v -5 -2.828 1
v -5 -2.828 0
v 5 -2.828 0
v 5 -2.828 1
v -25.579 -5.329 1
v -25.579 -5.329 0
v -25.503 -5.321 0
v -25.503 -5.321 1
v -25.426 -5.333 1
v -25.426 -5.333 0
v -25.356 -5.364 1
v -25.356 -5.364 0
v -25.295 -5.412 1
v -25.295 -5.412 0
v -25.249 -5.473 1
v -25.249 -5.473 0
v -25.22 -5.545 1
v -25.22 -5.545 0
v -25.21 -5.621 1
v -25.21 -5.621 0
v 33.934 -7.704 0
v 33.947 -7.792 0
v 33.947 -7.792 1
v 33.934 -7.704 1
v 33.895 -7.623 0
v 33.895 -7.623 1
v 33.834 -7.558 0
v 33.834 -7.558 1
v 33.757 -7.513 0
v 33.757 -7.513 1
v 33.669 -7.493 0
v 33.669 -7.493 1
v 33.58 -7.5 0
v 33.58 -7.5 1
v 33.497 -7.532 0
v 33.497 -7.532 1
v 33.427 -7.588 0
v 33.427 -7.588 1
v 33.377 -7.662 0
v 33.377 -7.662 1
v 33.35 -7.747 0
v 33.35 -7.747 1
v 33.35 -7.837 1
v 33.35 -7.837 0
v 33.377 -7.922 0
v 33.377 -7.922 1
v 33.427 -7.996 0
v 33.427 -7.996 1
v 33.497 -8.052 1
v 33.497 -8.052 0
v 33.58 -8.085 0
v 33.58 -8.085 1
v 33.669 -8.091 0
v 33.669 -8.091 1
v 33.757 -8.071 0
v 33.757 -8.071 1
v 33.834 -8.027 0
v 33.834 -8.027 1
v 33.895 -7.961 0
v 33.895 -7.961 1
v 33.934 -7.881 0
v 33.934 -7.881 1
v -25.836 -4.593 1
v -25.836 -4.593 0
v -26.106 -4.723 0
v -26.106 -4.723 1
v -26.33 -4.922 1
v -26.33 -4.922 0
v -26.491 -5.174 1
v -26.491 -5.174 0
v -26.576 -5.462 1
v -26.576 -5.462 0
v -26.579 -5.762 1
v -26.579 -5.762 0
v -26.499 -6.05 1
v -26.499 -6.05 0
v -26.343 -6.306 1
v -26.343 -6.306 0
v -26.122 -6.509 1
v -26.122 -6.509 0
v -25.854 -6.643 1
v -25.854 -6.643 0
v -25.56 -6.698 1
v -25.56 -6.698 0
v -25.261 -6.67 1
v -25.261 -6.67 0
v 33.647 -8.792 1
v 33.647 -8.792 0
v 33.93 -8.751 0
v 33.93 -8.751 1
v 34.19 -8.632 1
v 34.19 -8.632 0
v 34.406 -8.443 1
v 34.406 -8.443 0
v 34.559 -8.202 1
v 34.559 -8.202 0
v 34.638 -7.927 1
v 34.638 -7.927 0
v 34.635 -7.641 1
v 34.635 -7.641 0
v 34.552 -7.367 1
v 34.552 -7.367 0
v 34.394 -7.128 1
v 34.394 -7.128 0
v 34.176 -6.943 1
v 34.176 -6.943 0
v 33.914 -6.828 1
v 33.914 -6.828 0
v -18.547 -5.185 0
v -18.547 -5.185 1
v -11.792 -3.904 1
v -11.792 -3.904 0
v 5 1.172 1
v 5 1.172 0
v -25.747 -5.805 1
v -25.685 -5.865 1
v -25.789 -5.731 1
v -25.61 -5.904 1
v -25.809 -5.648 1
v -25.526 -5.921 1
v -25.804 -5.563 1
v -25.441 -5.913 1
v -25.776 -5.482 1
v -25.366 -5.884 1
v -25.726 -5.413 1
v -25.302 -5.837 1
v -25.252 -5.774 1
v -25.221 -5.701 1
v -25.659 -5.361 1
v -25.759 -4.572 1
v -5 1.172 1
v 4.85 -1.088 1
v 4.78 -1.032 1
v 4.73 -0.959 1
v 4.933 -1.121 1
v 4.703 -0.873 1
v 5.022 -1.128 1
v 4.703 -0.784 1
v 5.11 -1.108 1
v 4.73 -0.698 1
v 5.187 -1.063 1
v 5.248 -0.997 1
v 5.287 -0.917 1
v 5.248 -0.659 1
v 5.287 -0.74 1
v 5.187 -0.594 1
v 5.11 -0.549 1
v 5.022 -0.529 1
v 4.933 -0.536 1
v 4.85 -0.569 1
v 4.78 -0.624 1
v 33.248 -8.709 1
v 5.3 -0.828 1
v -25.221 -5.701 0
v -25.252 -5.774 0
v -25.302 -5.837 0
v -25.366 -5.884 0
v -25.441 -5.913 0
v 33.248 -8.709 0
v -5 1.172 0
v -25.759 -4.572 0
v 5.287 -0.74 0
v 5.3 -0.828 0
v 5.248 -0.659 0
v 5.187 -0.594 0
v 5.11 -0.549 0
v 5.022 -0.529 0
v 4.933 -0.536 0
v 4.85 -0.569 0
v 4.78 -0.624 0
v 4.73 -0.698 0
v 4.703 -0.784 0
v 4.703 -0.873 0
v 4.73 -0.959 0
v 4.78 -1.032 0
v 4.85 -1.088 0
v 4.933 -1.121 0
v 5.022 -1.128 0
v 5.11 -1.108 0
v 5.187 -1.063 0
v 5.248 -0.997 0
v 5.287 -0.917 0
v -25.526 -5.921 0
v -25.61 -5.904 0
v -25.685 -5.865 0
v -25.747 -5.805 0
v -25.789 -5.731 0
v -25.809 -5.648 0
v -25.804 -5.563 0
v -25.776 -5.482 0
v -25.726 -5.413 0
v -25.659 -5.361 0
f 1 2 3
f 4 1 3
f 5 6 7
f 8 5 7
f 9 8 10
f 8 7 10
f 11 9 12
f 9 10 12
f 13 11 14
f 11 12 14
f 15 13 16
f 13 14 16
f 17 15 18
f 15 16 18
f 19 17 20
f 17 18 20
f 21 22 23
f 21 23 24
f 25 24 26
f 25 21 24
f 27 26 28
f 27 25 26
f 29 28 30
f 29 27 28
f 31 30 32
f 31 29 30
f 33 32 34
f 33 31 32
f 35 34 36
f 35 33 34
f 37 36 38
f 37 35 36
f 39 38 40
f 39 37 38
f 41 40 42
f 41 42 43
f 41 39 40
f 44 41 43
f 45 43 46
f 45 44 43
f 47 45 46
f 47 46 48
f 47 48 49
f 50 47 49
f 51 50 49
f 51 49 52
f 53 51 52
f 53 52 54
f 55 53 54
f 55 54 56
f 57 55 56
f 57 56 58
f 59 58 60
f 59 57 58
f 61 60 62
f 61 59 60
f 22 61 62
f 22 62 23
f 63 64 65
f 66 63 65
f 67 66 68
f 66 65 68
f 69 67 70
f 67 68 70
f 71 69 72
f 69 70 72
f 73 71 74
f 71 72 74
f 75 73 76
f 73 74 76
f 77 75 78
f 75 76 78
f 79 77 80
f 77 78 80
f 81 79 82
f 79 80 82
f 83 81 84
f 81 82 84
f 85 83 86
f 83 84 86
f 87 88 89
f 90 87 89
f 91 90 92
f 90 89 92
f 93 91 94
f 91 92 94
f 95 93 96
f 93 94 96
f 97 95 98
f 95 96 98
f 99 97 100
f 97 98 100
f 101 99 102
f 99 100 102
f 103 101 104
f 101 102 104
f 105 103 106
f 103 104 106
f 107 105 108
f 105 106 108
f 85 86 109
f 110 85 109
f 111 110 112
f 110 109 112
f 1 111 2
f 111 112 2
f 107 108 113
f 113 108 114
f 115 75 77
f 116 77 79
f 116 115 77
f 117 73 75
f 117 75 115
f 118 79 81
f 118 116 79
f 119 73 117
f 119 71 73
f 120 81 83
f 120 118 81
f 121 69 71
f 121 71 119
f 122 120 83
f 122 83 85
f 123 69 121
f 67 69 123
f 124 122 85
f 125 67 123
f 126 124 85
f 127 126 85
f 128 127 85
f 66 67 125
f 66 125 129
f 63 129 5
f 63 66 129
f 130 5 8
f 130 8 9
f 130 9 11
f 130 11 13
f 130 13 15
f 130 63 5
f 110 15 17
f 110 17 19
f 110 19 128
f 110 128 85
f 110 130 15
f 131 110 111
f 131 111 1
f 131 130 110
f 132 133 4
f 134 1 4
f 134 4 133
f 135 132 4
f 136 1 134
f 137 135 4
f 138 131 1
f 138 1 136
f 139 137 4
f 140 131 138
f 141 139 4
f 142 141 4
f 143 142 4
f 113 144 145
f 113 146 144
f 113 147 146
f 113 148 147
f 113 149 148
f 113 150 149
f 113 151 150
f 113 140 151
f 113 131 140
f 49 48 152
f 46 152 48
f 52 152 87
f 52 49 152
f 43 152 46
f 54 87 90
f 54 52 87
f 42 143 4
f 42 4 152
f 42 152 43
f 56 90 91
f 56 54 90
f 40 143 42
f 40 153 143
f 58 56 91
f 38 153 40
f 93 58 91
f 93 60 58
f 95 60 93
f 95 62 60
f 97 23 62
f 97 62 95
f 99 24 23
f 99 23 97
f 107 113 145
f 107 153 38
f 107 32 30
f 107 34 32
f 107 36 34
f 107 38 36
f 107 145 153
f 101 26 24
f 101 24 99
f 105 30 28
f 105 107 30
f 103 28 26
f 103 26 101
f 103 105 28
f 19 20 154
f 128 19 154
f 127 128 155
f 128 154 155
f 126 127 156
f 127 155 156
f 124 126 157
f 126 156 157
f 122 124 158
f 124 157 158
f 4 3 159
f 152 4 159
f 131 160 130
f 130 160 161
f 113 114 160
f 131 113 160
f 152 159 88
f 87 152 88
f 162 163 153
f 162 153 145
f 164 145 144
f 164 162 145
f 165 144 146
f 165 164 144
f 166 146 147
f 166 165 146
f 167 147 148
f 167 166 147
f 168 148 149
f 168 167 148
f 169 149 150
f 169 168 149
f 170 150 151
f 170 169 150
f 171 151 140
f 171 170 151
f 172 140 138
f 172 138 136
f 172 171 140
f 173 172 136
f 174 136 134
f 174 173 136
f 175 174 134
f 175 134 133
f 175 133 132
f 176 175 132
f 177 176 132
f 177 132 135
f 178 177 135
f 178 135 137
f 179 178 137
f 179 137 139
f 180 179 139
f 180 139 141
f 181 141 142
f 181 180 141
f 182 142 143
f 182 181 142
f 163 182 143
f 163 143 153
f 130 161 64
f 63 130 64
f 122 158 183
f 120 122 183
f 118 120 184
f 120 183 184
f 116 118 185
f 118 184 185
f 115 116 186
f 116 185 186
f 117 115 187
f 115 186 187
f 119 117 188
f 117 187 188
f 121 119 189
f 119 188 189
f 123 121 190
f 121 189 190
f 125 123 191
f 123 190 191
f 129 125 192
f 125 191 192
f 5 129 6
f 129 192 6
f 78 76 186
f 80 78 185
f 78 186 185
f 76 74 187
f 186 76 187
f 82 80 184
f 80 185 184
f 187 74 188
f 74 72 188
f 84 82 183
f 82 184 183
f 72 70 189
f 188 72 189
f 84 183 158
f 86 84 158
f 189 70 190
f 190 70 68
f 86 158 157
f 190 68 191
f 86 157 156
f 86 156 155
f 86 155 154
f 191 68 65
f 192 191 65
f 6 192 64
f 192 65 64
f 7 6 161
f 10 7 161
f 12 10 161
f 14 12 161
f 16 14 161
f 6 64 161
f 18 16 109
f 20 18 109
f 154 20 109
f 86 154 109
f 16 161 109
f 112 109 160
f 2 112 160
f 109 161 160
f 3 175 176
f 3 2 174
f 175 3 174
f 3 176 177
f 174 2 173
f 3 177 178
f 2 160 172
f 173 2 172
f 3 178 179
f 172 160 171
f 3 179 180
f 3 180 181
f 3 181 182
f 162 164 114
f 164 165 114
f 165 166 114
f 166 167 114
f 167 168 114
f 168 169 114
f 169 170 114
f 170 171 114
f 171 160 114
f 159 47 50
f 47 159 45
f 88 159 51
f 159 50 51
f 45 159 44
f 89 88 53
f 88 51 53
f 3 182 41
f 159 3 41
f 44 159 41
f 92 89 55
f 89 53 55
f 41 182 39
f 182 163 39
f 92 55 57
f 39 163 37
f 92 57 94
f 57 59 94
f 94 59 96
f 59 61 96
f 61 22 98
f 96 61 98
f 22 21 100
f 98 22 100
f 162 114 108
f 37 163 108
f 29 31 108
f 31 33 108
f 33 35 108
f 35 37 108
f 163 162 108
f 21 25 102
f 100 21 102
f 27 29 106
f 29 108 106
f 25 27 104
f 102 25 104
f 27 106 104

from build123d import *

# Parameters (mm, degrees)
SKETCH_1_R      = 0.3
EXTRUDE_1_DEPTH = 1


with BuildPart() as part:
    # 草图1 → 凸台-拉伸1 (new body)
    with BuildSketch(Plane.XY):
        with BuildLine():
            ThreePointArc((-24.431752563, -5.621234593), (-24.841338221, -4.775340284), (-25.758932756, -4.572072325))
            Line((-25.758932756, -4.572072325), (-25.579283033, -5.329336265))
            ThreePointArc((-25.579283033, -5.329336265), (-25.32398953, -5.385889555), (-25.210034452, -5.621234593))
            ThreePointArc((-25.210034452, -5.621234593), (-25.274689413, -5.807279515), (-25.44078587, -5.913132921))
            Line((-25.44078587, -5.913132921), (-25.261136147, -6.670396861))
            ThreePointArc((-25.261136147, -6.670396861), (-24.664140143, -6.289930824), (-24.431752563, -5.621234593))
        make_face()
        with BuildLine():
            Line((-25.579283033, -5.329336265), (-25.758932756, -4.572072325))
            Line((-25.758932756, -4.572072325), (-25.835826145, -4.593347633))
            ThreePointArc((-25.835826145, -4.593347633), (-26.54927048, -5.90877643), (-25.261136147, -6.670396861))
            Line((-25.261136147, -6.670396861), (-25.44078587, -5.913132921))
            ThreePointArc((-25.44078587, -5.913132921), (-25.80193278, -5.690483175), (-25.579283033, -5.329336265))
        make_face()
        with BuildLine():
            Line((0, 1.171629291), (-5, 1.171629291))
            Line((-5, 1.171629291), (-25.758932756, -4.572072325))
            ThreePointArc((-25.758932756, -4.572072325), (-24.841338221, -4.775340284), (-24.431752563, -5.621234593))
            ThreePointArc((-24.431752563, -5.621234593), (-24.664140143, -6.289930824), (-25.261136147, -6.670396861))
            ThreePointArc((-25.261136147, -6.670396861), (-15.17430636, -4.518727526), (-5, -2.828370709))
            Line((-5, -2.828370709), (0, -2.828370709))
            Line((0, -2.828370709), (0, 1.171629291))
        make_face()
        with BuildLine():
            Line((5, 1.171629291), (0, 1.171629291))
            Line((0, 1.171629291), (0, -2.828370709))
            Line((0, -2.828370709), (5, -2.828370709))
            Line((5, -2.828370709), (33.24792948, -8.709080669))
            Line((33.24792948, -8.709080669), (33.646997923, -8.792159528))
            ThreePointArc((33.646997923, -8.792159528), (34.637903776, -7.926716543), (33.91366459, -6.828370709))
            Line((33.91366459, -6.828370709), (5, 1.171629291))
        make_face()
        with Locations((33.646997923, -7.792159528)):
            Circle(SKETCH_1_R, mode=Mode.SUBTRACT)
        with Locations((5, -0.828370709)):
            Circle(SKETCH_1_R, mode=Mode.SUBTRACT)
    extrude(amount=EXTRUDE_1_DEPTH)


solid = part.part
